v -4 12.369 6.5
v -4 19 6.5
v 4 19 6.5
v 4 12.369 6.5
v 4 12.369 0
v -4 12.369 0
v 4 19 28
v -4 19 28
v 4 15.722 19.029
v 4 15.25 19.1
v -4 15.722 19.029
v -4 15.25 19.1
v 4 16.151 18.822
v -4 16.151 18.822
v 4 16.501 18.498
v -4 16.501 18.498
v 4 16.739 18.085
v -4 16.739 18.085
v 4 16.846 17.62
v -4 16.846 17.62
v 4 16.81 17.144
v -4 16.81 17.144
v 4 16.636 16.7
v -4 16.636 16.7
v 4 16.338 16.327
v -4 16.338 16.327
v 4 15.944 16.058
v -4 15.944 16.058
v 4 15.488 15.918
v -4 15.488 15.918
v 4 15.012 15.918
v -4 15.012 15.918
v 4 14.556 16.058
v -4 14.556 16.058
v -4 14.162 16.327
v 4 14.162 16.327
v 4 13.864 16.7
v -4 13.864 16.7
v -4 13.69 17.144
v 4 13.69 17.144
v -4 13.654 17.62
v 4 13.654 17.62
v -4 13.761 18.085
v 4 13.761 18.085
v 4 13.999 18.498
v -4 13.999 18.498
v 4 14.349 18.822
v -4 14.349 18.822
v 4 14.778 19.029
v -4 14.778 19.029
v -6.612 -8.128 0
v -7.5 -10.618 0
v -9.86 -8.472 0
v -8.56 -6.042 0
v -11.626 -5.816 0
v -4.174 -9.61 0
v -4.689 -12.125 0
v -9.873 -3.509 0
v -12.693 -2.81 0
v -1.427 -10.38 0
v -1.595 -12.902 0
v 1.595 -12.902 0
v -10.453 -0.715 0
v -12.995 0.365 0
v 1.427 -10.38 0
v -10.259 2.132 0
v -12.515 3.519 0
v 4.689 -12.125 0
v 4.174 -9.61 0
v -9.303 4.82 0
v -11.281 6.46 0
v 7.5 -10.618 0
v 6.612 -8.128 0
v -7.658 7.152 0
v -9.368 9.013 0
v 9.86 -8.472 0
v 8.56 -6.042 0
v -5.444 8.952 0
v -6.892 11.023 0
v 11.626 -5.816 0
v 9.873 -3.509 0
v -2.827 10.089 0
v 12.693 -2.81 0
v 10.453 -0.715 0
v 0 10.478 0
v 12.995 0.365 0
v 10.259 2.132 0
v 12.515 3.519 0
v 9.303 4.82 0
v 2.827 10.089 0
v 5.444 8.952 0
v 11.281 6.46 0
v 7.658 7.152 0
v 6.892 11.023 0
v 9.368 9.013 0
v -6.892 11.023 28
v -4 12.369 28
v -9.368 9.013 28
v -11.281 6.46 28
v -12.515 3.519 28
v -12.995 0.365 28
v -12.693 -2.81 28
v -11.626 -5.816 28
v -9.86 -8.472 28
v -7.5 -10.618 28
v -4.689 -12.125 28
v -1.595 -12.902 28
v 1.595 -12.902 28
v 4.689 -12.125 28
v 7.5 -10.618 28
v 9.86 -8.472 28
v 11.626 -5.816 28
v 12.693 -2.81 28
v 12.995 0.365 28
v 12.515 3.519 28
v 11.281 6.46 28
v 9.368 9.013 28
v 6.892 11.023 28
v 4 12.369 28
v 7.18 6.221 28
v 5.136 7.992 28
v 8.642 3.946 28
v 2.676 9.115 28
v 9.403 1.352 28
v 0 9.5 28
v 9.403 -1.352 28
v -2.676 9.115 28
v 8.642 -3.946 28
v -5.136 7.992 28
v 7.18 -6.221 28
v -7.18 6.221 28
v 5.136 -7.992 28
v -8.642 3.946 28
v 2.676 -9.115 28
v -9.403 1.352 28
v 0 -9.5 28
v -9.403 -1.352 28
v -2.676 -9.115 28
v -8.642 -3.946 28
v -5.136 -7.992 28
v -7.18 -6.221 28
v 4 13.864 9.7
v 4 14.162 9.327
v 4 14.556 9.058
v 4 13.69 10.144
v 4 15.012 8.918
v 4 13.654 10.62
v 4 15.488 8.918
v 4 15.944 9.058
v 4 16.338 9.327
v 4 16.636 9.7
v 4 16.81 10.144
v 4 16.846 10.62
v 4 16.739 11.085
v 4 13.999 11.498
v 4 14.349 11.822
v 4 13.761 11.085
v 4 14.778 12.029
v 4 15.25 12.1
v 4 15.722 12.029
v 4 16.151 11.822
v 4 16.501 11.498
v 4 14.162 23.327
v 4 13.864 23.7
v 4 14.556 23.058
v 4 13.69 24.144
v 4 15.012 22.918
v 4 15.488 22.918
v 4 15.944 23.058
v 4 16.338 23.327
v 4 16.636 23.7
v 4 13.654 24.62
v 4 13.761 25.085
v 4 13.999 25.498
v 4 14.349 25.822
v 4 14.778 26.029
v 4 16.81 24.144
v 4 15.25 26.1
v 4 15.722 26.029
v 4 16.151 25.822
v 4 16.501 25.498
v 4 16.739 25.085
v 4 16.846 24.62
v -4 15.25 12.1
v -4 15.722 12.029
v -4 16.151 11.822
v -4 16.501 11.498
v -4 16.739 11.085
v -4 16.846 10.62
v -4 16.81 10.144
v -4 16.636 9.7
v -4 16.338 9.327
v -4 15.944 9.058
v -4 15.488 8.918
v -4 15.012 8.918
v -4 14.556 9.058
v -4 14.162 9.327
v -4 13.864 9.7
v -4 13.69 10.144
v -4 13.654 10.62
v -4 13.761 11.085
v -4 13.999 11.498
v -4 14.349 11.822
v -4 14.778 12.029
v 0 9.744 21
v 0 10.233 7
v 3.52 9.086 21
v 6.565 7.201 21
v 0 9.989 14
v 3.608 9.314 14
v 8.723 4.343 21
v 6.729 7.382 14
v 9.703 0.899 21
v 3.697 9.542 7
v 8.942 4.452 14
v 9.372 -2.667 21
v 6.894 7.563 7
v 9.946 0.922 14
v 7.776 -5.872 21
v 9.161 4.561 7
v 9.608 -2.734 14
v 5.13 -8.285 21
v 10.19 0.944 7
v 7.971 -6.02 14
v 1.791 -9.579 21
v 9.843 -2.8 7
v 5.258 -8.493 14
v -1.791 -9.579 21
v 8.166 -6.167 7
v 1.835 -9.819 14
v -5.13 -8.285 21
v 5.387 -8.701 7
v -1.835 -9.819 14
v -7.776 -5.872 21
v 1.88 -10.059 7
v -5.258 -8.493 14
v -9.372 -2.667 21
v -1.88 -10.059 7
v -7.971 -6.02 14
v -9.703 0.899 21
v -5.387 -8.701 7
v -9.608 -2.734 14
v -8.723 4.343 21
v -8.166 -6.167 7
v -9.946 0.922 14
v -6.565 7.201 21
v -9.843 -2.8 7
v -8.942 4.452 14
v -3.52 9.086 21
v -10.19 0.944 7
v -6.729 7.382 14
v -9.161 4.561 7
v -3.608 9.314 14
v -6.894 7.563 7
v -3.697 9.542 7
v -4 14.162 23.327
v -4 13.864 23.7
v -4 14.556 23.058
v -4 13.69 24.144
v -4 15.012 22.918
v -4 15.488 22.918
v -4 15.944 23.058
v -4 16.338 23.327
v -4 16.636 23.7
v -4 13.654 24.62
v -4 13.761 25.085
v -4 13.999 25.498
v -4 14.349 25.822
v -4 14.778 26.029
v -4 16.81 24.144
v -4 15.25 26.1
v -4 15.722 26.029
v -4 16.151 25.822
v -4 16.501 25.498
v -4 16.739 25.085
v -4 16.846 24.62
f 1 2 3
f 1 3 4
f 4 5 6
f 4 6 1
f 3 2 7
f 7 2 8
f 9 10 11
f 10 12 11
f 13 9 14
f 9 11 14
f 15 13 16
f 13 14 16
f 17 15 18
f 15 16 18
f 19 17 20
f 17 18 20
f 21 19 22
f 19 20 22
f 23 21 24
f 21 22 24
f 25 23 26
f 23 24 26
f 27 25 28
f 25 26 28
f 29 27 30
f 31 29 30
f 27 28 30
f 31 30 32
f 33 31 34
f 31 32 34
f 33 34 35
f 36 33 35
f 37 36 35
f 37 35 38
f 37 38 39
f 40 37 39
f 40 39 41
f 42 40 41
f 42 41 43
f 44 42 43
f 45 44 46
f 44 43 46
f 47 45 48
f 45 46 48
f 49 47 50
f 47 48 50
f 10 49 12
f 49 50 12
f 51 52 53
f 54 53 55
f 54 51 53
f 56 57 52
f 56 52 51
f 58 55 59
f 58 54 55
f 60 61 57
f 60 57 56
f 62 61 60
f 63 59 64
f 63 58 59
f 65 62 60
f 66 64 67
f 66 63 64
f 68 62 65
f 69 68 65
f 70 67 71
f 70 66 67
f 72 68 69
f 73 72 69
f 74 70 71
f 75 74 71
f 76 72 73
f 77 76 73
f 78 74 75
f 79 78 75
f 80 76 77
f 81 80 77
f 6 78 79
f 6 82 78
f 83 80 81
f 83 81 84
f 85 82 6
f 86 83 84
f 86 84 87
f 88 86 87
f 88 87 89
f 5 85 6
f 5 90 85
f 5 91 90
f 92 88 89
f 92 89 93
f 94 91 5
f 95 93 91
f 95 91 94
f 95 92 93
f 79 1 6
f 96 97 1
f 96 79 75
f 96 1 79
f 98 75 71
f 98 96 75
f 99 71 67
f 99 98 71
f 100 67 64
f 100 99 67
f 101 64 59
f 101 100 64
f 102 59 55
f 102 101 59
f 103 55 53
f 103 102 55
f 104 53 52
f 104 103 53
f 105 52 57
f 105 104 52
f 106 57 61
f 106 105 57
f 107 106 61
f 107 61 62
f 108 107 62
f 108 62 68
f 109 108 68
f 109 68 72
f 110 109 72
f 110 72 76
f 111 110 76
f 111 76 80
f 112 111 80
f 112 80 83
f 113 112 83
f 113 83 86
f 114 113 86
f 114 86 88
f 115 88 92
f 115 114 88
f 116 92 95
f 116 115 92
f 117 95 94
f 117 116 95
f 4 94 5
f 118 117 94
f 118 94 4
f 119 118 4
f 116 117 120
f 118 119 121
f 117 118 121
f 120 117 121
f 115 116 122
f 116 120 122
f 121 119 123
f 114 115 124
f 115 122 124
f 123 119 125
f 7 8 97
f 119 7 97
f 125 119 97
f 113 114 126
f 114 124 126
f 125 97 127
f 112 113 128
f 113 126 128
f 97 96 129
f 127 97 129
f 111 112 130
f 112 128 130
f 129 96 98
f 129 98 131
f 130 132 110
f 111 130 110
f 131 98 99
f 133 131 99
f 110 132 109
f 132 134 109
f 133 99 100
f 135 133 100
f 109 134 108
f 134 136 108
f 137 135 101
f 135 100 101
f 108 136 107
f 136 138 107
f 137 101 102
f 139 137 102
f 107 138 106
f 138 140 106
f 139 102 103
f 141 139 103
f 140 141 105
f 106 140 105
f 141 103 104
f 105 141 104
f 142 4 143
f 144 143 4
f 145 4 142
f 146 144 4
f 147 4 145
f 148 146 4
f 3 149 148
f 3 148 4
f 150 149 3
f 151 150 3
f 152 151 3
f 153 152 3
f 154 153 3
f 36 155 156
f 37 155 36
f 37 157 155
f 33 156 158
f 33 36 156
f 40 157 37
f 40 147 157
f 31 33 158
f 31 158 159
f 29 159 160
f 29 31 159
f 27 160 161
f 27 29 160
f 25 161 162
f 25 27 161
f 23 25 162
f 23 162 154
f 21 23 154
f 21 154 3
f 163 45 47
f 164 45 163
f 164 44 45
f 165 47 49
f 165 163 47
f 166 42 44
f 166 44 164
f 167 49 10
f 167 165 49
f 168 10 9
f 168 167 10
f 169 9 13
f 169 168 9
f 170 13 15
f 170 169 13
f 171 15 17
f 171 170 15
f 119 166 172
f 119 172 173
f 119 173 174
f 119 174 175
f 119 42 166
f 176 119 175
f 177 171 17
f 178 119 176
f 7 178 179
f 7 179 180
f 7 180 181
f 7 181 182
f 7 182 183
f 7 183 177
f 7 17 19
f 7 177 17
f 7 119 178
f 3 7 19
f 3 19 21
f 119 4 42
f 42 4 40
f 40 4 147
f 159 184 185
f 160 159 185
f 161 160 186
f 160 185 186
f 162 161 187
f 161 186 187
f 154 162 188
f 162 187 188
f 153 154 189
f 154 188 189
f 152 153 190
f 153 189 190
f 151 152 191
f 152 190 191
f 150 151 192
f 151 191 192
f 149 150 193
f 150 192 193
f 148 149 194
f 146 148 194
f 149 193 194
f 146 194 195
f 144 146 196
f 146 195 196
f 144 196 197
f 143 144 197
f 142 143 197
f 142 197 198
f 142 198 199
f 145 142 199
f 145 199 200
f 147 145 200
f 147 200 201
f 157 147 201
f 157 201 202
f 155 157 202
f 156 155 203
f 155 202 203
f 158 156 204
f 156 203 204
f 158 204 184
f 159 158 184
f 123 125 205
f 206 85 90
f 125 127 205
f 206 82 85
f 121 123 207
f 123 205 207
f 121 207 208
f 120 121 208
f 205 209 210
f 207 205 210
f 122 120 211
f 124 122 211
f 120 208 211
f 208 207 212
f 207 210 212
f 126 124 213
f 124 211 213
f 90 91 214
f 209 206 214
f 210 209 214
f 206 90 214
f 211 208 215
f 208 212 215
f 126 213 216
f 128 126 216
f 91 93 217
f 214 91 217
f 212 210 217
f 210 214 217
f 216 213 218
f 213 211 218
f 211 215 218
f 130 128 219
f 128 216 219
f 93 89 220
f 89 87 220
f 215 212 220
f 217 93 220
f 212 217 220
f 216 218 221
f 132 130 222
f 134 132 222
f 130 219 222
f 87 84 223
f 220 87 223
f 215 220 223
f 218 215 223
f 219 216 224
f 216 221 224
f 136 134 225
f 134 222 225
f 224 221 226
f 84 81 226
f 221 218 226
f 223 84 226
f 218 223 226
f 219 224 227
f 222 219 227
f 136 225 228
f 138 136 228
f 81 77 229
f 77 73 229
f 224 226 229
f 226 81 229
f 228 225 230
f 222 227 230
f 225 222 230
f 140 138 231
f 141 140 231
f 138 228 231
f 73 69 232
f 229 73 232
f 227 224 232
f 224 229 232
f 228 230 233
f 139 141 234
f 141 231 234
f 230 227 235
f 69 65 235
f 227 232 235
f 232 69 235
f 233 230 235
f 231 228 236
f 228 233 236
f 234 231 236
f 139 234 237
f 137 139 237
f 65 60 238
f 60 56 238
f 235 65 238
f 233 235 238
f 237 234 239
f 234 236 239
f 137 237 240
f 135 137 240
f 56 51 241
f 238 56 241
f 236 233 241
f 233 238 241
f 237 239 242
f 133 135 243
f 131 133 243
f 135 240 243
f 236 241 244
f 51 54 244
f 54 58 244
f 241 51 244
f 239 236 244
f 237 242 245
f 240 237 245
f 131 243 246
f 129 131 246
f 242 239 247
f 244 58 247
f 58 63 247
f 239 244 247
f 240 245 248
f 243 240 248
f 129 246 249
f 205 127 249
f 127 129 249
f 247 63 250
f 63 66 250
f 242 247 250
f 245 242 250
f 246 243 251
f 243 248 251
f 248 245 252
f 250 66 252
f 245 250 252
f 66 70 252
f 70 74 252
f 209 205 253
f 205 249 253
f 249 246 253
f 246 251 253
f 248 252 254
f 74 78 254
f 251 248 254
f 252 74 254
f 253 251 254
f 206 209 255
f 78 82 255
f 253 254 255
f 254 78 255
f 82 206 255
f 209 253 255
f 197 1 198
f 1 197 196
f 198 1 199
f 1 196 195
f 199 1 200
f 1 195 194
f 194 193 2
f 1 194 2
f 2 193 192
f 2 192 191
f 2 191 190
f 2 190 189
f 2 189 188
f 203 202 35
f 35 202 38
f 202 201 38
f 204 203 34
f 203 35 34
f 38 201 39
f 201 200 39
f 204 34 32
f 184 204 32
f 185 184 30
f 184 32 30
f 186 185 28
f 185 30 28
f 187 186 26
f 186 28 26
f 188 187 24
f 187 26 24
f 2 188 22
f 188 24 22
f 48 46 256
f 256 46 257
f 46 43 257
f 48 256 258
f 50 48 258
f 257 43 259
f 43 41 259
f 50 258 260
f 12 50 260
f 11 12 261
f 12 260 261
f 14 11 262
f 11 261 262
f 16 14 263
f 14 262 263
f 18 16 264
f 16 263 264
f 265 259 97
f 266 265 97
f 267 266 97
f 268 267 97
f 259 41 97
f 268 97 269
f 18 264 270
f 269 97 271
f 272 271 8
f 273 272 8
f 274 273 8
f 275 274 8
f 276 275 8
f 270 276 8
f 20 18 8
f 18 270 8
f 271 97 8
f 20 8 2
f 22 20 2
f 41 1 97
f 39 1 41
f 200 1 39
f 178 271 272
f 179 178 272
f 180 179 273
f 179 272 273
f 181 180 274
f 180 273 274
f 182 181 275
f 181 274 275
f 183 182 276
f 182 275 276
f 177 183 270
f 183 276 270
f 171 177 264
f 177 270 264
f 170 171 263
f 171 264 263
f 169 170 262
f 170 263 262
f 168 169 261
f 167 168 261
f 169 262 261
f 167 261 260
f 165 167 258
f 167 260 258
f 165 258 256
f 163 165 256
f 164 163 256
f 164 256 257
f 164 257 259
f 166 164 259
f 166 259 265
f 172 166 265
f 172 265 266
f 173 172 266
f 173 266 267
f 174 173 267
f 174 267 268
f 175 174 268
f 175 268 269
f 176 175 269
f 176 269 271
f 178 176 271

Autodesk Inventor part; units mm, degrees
ref_plane "YZ Plane" through (0, 0, 0) normal (1, 0, 0) x (0, 1, 0)
ref_plane "XZ Plane" through (0, 0, 0) normal (0, 1, 0) x (-1, 0, 0)
ref_plane "XY Plane" through (0, 0, 0) normal (0, 0, 1) x (1, 0, 0)
sketch "Sketch1" plane through (0, 0, 0) normal (1, 0, 0) x (0, 1, 0)
  line L0 (0, 12.5) -> (0, 0) construction
  line L1 (13, 0) -> (13, 28)
  line L2 (13, 28) -> (9.5, 28)
  line L3 (9.5, 28) -> (10.4778, 0)
  line L4 (13, 0) -> (10.4778, 0)
  dimension "d36" = 13
  dimension "d63" = 28
  dimension "d65" = 9.5
  dimension "d66" = 92
revolve "Revolution1" add sketch "Sketch1" angle 360 about axis through (0, 0, 12.5) along (0, 0, -1)
sketch "Sketch3" plane through (0, 0, 0) normal (1, 0, 0) x (0, 1, 0)
  line L0 (19, 0) -> (19, 28)
  line L1 (19, 28) -> (10.4778, 28)
  line L2 (19, 0) -> (10.4778, 0)
  line L3 (-10.4778, 0) -> (10.4778, 0) projected
  line L4 (10.4778, 0) -> (10.4778, 28)
  line L5 (-13, 28) -> (13, 28) projected
  point P0 (0, 0)
  dimension "d28" = 19
extrude "Extrusion1" add sketch "Sketch3" along normal mid plane 8
sketch "Sketch4" plane through (-4, 0, 0) normal (-1, 0, 0) x (0, 0, 1)
  circle A0 centre (10.5, 15.25) radius 1.6
  circle A1 centre (17.5, 15.25) radius 1.6
  line L0 (10.5, 15.25) -> (17.5, 15.25) construction
  line L1 (28, 19) -> (0, 19) construction
  circle A2 centre (24.5, 15.25) radius 1.6
  point P0 (0, 0)
  point P1 (17, 15.25)
  point P2 (14, 15.25)
  point P3 (14, 19)
  dimension "d29" = 3.2
  dimension "d30" = 3.2
  dimension "d31" = 7
  dimension "d34" = 3.75
  dimension "d67" = 3.2
  dimension "d68" = 7
extrude "Extrusion2" cut sketch "Sketch4" against normal blind 10
sketch "Sketch5" plane through (4, 0, 0) normal (1, 0, 0) x (0, 0, -1)
  circle A0 centre (-10.5, 15.25) radius 1.6 projected
  circle A1 centre (-17.5, 15.25) radius 1.6 projected
  line L0 (0, 12.3693) -> (-28, 12.3693) projected
  line L1 (-20.496, 19) -> (-21.5, 19)
  line L2 (-21.5, 19) -> (-21.5, 12.3693)
  line L3 (-21.5, 12.3693) -> (-20.496, 12.3693)
  line L4 (-20.496, 12.3693) -> (-20.496, 19)
  line L5 (0, 19) -> (-6.5, 19)
  line L6 (-6.5, 19) -> (-6.5, 12.3693)
  line L7 (-6.5, 12.3693) -> (0, 12.3693)
  line L8 (0, 12.3693) -> (0, 19)
  line L9 (0, 19) -> (-28, 19) projected
  point P0 (0, 0)
  dimension "d47" = 15
  dimension "d49" = 4
  dimension "d50" = 4
extrude "Extrusion3" cut sketch "Sketch5" against normal blind 10 contours L0 L6 L5 L8
equation "\"d49\" = d50"
properties part number "brush holder v5"
